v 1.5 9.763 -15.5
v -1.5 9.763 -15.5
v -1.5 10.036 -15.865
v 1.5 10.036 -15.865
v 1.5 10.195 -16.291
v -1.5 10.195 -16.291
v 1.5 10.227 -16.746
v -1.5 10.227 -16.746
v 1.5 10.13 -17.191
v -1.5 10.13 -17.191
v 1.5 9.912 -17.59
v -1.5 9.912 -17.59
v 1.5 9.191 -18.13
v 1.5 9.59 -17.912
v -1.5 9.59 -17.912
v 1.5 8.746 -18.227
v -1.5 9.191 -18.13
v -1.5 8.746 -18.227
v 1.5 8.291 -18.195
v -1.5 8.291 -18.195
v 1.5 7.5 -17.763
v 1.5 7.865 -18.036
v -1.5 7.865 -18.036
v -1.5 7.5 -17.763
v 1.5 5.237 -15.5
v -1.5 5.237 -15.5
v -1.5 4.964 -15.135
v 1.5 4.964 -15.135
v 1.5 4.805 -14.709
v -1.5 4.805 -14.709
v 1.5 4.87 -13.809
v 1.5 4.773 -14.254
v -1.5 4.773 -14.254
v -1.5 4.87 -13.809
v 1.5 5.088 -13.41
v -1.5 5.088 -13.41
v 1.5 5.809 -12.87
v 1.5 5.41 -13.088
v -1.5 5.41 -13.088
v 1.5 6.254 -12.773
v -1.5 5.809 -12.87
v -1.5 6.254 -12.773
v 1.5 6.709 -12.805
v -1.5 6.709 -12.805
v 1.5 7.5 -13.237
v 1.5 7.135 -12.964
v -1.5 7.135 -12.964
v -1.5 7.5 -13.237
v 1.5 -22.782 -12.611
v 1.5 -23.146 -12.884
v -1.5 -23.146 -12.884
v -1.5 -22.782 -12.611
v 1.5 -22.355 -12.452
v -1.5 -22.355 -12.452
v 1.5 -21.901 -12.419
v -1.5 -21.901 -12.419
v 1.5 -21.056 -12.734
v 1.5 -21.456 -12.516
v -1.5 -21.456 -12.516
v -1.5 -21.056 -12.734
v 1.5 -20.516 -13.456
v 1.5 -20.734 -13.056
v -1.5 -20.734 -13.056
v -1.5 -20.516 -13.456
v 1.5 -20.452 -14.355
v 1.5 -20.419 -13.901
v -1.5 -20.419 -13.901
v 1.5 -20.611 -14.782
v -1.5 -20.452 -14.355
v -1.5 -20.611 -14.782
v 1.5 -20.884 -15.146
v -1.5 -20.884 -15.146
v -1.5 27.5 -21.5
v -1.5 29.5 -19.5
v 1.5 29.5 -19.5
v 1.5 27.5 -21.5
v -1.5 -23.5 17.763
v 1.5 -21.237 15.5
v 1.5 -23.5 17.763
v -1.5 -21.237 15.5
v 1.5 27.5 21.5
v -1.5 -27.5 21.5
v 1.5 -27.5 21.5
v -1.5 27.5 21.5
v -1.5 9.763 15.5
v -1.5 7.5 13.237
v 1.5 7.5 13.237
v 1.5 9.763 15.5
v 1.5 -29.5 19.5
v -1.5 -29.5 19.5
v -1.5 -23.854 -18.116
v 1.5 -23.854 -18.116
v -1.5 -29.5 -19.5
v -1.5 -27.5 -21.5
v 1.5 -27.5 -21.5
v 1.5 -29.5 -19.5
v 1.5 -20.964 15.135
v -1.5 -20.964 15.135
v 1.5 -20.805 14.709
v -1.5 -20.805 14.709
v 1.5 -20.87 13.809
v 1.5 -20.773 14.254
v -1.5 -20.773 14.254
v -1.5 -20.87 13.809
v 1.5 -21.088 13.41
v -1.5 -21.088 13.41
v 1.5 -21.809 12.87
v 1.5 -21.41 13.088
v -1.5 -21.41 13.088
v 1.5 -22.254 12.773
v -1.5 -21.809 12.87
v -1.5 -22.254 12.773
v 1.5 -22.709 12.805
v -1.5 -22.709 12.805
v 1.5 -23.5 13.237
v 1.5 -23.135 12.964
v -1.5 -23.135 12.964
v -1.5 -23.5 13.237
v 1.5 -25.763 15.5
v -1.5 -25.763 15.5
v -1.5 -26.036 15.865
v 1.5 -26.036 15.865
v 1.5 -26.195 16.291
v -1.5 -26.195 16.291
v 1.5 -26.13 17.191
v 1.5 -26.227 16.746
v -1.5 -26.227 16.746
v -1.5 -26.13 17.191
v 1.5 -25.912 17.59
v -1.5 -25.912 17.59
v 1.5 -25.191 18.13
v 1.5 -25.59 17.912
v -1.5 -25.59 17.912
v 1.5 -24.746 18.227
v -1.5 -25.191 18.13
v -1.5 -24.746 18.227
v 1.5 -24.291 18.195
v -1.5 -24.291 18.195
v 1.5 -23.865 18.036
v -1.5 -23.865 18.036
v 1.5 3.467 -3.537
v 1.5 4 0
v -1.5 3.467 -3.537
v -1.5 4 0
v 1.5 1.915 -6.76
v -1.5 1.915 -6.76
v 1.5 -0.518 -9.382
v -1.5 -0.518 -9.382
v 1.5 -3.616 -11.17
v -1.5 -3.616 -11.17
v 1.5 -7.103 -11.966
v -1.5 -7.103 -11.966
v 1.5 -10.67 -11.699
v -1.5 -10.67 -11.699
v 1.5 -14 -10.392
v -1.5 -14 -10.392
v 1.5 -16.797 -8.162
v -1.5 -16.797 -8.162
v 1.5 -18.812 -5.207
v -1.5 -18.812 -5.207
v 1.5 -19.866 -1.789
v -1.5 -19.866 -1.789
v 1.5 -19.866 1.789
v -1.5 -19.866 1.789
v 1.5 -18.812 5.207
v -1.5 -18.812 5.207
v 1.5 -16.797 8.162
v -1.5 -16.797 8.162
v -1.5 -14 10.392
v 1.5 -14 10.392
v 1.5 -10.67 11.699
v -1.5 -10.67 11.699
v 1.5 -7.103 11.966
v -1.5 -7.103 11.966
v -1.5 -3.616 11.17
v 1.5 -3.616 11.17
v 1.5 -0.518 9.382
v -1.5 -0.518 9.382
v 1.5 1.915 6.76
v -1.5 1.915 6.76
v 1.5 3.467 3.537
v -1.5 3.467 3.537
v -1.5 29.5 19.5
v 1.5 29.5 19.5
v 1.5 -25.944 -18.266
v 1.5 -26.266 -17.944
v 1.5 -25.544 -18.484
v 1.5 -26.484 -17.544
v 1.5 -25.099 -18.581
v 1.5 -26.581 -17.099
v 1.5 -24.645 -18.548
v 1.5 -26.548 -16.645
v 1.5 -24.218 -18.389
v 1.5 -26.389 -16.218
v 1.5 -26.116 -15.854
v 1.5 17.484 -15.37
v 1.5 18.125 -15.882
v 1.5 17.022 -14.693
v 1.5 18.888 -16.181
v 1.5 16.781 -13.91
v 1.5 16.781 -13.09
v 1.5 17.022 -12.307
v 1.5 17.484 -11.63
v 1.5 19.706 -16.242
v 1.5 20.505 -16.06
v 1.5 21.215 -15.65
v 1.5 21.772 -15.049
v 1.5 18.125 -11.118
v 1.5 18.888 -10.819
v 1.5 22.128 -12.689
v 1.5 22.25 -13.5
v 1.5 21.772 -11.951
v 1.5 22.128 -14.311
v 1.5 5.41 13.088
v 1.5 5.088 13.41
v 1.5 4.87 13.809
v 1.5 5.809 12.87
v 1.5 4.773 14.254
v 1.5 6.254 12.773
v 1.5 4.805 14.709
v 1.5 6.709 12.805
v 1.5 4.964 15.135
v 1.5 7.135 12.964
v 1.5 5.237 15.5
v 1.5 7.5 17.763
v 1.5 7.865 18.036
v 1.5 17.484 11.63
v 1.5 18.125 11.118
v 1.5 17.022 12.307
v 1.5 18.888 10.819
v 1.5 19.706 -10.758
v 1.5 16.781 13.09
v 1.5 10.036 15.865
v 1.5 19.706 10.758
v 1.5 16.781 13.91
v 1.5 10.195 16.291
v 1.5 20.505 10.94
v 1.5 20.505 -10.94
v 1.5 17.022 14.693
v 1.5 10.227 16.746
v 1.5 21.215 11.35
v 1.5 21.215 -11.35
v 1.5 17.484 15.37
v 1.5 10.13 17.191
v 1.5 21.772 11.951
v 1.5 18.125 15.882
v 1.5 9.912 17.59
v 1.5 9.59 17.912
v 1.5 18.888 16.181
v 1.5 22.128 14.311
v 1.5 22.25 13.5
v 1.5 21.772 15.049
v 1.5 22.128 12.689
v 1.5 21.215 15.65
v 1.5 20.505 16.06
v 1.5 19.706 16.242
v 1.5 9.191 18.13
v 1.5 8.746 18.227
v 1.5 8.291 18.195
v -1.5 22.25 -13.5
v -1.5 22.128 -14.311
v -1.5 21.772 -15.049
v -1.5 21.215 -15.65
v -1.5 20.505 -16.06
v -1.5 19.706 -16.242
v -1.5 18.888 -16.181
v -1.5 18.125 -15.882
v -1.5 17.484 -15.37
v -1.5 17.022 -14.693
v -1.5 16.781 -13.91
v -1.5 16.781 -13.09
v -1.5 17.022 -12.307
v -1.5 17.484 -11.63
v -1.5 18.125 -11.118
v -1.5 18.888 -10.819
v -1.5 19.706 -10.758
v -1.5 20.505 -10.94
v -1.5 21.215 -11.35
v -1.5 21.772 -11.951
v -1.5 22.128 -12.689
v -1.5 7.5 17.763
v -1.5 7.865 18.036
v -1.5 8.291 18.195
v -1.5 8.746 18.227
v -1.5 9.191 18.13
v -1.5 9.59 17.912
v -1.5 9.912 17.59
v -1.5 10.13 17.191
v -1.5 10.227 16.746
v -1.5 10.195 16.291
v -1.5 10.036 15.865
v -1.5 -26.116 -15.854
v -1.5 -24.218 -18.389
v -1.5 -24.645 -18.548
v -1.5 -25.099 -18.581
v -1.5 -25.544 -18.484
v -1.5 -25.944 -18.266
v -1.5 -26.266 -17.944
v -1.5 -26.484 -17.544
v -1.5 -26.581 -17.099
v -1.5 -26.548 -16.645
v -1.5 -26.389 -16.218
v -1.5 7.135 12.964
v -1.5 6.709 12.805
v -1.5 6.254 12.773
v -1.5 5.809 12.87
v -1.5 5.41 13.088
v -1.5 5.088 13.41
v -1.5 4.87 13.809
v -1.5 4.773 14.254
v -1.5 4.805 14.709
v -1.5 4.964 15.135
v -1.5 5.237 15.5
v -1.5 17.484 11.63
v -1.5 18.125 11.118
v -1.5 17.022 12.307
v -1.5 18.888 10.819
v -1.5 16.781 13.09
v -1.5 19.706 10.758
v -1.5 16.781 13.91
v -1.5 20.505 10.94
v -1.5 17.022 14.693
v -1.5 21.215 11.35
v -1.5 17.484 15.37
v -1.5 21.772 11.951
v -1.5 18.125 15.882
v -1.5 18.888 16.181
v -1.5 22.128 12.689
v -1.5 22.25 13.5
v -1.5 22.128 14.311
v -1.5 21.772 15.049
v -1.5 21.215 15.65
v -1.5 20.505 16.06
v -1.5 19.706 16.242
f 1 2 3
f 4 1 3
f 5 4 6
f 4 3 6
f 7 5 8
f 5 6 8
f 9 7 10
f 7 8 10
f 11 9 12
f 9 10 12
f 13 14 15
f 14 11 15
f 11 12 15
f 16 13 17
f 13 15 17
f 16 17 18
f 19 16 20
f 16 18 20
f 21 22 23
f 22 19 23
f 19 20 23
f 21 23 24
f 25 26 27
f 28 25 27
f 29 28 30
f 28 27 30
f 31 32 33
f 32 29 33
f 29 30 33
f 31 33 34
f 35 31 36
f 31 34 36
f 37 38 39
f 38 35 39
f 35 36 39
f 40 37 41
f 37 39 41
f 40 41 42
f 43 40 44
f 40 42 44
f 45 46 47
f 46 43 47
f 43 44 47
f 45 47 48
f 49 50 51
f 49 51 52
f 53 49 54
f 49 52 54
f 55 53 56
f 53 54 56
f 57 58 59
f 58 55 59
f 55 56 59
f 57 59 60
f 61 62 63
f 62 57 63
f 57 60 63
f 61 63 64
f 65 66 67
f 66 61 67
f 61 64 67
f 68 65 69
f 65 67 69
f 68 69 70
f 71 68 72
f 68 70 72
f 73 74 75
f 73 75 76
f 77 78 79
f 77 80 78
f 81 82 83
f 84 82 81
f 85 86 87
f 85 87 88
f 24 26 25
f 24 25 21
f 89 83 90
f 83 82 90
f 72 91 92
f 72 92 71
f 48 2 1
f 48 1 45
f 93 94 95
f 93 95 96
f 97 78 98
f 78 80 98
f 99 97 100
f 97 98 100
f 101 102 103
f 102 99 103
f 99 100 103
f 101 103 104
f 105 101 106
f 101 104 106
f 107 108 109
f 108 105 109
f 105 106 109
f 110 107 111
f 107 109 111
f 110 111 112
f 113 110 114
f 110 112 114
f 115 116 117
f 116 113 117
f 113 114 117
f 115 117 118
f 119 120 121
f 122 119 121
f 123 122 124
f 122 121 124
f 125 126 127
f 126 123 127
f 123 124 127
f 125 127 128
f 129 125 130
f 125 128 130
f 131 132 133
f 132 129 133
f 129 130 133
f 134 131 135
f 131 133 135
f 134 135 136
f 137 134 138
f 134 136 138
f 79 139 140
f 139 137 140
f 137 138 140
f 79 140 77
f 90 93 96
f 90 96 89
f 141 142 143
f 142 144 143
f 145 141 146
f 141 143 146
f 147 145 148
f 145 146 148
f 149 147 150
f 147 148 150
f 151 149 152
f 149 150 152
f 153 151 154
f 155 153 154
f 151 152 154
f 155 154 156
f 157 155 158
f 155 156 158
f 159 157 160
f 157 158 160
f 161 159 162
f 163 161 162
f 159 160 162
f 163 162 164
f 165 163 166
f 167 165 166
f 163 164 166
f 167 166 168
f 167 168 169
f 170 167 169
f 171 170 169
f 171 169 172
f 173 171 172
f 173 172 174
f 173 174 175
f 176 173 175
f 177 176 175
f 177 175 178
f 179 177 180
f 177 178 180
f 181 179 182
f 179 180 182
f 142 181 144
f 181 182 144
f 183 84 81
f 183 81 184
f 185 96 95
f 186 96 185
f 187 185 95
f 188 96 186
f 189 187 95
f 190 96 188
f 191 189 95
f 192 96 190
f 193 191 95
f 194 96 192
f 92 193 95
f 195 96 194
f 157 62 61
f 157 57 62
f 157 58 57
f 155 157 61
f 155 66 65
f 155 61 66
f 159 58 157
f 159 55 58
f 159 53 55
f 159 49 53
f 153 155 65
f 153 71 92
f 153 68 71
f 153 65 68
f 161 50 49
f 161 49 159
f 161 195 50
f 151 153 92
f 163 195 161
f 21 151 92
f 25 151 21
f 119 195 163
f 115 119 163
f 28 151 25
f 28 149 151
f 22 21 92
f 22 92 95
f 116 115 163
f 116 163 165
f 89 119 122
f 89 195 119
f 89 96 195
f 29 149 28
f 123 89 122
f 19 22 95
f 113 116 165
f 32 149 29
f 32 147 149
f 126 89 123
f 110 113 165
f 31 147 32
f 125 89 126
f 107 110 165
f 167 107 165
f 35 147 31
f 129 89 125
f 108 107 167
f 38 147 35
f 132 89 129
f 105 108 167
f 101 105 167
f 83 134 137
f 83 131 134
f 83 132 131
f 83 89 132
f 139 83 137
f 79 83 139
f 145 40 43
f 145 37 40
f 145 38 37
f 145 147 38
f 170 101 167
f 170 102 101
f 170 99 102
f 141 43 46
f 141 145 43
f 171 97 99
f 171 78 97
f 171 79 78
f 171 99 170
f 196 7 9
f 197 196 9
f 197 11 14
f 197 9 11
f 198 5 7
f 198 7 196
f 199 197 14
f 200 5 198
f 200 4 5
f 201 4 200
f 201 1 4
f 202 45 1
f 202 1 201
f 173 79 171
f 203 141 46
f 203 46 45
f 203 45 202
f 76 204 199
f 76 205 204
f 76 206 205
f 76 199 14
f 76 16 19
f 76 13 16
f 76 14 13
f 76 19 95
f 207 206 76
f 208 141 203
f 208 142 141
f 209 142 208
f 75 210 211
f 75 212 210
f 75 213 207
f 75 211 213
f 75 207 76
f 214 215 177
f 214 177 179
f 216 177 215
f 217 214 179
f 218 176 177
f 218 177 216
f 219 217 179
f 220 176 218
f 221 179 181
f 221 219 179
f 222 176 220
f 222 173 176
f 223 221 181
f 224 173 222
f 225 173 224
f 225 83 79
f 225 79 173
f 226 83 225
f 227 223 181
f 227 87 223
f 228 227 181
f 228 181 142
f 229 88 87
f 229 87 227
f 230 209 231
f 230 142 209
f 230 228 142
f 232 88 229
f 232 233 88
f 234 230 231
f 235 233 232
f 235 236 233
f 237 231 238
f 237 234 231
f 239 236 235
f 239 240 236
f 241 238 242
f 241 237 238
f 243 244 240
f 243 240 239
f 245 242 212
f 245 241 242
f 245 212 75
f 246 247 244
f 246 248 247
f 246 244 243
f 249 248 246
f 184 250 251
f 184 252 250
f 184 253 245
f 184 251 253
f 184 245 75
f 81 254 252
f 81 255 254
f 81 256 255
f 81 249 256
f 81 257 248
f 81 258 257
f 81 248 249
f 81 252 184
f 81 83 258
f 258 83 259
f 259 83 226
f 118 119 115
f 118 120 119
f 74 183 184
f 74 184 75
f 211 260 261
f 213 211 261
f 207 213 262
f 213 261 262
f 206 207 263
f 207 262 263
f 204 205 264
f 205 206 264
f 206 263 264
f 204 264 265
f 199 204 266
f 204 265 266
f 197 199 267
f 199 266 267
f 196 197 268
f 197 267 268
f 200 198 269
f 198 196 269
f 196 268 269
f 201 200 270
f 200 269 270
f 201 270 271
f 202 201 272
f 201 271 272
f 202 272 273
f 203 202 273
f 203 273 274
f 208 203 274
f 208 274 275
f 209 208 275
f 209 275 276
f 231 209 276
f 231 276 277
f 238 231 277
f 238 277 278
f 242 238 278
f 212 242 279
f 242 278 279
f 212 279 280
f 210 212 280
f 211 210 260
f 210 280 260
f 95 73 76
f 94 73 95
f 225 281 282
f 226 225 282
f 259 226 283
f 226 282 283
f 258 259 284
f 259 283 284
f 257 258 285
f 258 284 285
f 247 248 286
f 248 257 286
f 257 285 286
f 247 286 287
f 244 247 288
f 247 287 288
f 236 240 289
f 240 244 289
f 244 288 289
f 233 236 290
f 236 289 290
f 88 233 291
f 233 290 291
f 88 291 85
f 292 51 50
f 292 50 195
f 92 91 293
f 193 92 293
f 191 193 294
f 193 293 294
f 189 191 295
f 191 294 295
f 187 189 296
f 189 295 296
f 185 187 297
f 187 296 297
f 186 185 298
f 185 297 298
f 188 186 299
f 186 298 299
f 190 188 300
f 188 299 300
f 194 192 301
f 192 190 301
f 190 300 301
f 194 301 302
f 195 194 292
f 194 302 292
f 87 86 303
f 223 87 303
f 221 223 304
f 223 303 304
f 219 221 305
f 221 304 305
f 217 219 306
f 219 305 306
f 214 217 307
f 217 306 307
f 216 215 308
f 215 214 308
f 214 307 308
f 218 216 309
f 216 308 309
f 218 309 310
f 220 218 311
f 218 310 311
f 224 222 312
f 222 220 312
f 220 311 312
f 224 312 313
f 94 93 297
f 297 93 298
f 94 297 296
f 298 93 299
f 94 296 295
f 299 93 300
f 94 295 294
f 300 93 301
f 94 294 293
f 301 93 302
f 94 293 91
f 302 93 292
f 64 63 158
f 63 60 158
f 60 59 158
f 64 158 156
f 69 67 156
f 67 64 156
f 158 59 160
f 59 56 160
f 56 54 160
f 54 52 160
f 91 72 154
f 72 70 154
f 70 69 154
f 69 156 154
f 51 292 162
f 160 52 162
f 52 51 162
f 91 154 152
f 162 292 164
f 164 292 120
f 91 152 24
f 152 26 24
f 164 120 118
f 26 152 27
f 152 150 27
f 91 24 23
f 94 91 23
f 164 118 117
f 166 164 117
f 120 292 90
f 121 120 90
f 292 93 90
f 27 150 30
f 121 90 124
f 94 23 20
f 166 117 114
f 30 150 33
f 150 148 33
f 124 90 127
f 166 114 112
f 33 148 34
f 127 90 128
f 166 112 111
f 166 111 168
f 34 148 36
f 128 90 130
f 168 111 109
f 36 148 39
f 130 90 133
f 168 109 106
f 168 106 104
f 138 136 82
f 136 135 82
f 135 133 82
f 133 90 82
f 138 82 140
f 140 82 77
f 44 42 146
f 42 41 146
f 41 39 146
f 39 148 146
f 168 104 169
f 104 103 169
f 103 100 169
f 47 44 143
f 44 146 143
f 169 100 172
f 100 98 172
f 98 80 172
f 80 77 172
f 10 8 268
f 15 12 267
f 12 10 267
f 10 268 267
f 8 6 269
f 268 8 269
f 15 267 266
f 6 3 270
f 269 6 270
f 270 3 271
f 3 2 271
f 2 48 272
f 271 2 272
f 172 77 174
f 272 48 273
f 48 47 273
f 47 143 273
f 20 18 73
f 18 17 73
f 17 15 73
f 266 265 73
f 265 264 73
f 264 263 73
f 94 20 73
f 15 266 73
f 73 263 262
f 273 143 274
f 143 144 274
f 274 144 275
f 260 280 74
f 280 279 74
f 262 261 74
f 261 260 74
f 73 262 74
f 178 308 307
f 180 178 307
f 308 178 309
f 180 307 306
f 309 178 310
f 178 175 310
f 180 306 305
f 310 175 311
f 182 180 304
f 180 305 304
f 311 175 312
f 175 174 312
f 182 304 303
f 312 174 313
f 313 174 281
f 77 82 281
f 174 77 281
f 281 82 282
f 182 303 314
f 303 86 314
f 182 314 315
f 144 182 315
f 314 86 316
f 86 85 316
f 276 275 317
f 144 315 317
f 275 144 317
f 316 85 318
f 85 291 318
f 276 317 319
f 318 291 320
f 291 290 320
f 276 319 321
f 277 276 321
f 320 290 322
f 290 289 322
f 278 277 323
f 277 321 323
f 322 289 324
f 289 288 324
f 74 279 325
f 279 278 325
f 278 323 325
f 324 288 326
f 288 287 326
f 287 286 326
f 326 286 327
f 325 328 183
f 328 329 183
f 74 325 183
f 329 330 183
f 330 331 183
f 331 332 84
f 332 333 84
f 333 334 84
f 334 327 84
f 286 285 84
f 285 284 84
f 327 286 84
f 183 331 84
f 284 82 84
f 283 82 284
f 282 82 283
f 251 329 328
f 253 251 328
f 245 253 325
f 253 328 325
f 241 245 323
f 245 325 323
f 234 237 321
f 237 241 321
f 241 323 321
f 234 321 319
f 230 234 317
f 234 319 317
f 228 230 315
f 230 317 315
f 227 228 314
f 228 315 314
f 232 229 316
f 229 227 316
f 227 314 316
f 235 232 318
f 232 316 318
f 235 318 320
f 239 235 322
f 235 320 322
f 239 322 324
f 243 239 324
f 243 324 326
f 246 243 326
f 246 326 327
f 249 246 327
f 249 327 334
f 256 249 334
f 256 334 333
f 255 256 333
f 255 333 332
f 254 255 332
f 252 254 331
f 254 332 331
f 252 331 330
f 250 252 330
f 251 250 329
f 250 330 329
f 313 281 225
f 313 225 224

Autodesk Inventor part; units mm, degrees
ref_plane "YZ Plane" through (0, 0, 0) normal (1, 0, 0) x (0, 1, 0)
ref_plane "XZ Plane" through (0, 0, 0) normal (0, 1, 0) x (-1, 0, 0)
ref_plane "XY Plane" through (0, 0, 0) normal (0, 0, 1) x (1, 0, 0)
sketch "Skizze1" plane through (0, 0, 0) normal (1, 0, 0) x (0, 1, 0)
  line L0 (0, -30.1) -> (0, 30.1) projected
  line L1 (-41.3, 0) -> (41.3, 0) projected
  line L2 (-27.5, 21.5) -> (27.5, 21.5)
  line L3 (29.5, 19.5) -> (29.5, -19.5)
  line L4 (27.5, -21.5) -> (-27.5, -21.5)
  line L5 (-29.5, -19.5) -> (-29.5, 19.5)
  circle A0 centre (19.5, 13.5) radius 2.75
  circle A1 centre (19.5, -13.5) radius 2.75
  line L6 (27.5, 21.5) -> (29.5, 19.5)
  line L7 (29.5, -19.5) -> (27.5, -21.5)
  line L8 (-27.5, 21.5) -> (-29.5, 19.5)
  line L9 (-27.5, -21.5) -> (-29.5, -19.5)
  line L10 (8.6314, 16.6314) -> (6.3686, 14.3686) construction
  line L11 (7.5, 17.7627) -> (5.2373, 15.5)
  line L12 (7.5, 13.2373) -> (9.7627, 15.5)
  arc A2 (9.7627, 15.5) -> (7.5, 17.7627) centre (8.6314, 16.6314) ccw
  arc A3 (5.2373, 15.5) -> (7.5, 13.2373) centre (6.3686, 14.3686) ccw
  line L13 (-24.6314, 16.6314) -> (-22.3686, 14.3686) construction
  line L14 (-25.7627, 15.5) -> (-23.5, 13.2373)
  line L15 (-21.2373, 15.5) -> (-23.5, 17.7627)
  arc A4 (-23.5, 17.7627) -> (-25.7627, 15.5) centre (-24.6314, 16.6314) ccw
  arc A5 (-23.5, 13.2373) -> (-21.2373, 15.5) centre (-22.3686, 14.3686) ccw
  line L16 (8.6314, -16.6314) -> (6.3686, -14.3686) construction
  line L17 (9.7627, -15.5) -> (7.5, -13.2373)
  line L18 (5.2373, -15.5) -> (7.5, -17.7627)
  arc A6 (7.5, -17.7627) -> (9.7627, -15.5) centre (8.6314, -16.6314) ccw
  arc A7 (7.5, -13.2373) -> (5.2373, -15.5) centre (6.3686, -14.3686) ccw
  line L19 (-23.4997, -15.4997) -> (-23.5003, -15.5003) construction
  line L20 (-25.3683, -16.631) -> (-25.369, -16.6317)
  line L21 (-27.6317, -14.369) -> (-27.631, -14.3683)
  line L22 (-24.9849, -16.9849) -> (-22.0151, -14.0151) construction
  line L23 (-23.8536, -18.1163) -> (-20.8837, -15.1464)
  line L24 (-23.1464, -12.8837) -> (-26.1163, -15.8536)
  arc A8 (-26.1163, -15.8536) -> (-23.8536, -18.1163) centre (-24.9849, -16.9849) ccw
  arc A9 (-20.8837, -15.1464) -> (-23.1464, -12.8837) centre (-22.0151, -14.0151) ccw
  circle A10 centre (-8, 0) radius 12
  point P0 (0, 0)
  point P1 (-29.5, 21.5)
  point P2 (29.5, -21.5)
  point P3 (29.5, 21.5)
  point P4 (-29.5, -21.5)
  point P5 (7.5, 15.5)
  point P6 (-23.5, 15.5)
  point P7 (7.5, -15.5)
  point P8 (-23.5, -15.5)
  dimension "d0" = 59
  dimension "d1" = 43
  dimension "d2" = 5.5
  dimension "d3" = 10
  dimension "d4" = 8
  dimension "d14" = 2
  dimension "d15" = 2
  dimension "d16" = 2
  dimension "d17" = 2
  dimension "d18" = 2
  dimension "d19" = 2
  dimension "d20" = 2
  dimension "d21" = 2
  dimension "d22" = 3.2
  dimension "d23" = 3.2
  dimension "d24" = 3.2
  dimension "d26" = 6
  dimension "d27" = 31
  dimension "d28" = 31
  dimension "d31" = 2.1
  dimension "d32" = 3.2
  dimension "d35" = 24
  dimension "d36" = 15.5
extrude "Extrusion4" add sketch "Skizze1" along normal mid plane 3 contours L4 L9 L5 L1 A10 L0 | L0 A10 L1 L3 L7 L4 | L1 L5 L8 L2 L0 A10 | A10 L0 L2 L6 L3 L1
equation "\"d15\" = d14"
equation "\"d16\" = d14"
equation "\"d17\" = d16"
equation "\"d18\" = d14"
equation "\"d19\" = d18"
equation "\"d20\" = d14"
equation "\"d21\" = d20"
properties part number "Nema17_Montageplatte_Z-Achse" material "Aluminium 6061"
